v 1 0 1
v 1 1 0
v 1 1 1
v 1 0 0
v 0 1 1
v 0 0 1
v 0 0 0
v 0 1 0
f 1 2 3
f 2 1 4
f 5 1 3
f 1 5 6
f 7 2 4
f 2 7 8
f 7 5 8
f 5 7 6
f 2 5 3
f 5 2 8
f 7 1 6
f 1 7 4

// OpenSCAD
// A builtin module warns about its parameters before its children run.
module part(z) translate([0, 0, z]) {
  echo("child of translate");
  cube(z);
}
part(undef);
scale(undef) { echo("child of scale"); translate([0, 0, undef]) cube(); }
